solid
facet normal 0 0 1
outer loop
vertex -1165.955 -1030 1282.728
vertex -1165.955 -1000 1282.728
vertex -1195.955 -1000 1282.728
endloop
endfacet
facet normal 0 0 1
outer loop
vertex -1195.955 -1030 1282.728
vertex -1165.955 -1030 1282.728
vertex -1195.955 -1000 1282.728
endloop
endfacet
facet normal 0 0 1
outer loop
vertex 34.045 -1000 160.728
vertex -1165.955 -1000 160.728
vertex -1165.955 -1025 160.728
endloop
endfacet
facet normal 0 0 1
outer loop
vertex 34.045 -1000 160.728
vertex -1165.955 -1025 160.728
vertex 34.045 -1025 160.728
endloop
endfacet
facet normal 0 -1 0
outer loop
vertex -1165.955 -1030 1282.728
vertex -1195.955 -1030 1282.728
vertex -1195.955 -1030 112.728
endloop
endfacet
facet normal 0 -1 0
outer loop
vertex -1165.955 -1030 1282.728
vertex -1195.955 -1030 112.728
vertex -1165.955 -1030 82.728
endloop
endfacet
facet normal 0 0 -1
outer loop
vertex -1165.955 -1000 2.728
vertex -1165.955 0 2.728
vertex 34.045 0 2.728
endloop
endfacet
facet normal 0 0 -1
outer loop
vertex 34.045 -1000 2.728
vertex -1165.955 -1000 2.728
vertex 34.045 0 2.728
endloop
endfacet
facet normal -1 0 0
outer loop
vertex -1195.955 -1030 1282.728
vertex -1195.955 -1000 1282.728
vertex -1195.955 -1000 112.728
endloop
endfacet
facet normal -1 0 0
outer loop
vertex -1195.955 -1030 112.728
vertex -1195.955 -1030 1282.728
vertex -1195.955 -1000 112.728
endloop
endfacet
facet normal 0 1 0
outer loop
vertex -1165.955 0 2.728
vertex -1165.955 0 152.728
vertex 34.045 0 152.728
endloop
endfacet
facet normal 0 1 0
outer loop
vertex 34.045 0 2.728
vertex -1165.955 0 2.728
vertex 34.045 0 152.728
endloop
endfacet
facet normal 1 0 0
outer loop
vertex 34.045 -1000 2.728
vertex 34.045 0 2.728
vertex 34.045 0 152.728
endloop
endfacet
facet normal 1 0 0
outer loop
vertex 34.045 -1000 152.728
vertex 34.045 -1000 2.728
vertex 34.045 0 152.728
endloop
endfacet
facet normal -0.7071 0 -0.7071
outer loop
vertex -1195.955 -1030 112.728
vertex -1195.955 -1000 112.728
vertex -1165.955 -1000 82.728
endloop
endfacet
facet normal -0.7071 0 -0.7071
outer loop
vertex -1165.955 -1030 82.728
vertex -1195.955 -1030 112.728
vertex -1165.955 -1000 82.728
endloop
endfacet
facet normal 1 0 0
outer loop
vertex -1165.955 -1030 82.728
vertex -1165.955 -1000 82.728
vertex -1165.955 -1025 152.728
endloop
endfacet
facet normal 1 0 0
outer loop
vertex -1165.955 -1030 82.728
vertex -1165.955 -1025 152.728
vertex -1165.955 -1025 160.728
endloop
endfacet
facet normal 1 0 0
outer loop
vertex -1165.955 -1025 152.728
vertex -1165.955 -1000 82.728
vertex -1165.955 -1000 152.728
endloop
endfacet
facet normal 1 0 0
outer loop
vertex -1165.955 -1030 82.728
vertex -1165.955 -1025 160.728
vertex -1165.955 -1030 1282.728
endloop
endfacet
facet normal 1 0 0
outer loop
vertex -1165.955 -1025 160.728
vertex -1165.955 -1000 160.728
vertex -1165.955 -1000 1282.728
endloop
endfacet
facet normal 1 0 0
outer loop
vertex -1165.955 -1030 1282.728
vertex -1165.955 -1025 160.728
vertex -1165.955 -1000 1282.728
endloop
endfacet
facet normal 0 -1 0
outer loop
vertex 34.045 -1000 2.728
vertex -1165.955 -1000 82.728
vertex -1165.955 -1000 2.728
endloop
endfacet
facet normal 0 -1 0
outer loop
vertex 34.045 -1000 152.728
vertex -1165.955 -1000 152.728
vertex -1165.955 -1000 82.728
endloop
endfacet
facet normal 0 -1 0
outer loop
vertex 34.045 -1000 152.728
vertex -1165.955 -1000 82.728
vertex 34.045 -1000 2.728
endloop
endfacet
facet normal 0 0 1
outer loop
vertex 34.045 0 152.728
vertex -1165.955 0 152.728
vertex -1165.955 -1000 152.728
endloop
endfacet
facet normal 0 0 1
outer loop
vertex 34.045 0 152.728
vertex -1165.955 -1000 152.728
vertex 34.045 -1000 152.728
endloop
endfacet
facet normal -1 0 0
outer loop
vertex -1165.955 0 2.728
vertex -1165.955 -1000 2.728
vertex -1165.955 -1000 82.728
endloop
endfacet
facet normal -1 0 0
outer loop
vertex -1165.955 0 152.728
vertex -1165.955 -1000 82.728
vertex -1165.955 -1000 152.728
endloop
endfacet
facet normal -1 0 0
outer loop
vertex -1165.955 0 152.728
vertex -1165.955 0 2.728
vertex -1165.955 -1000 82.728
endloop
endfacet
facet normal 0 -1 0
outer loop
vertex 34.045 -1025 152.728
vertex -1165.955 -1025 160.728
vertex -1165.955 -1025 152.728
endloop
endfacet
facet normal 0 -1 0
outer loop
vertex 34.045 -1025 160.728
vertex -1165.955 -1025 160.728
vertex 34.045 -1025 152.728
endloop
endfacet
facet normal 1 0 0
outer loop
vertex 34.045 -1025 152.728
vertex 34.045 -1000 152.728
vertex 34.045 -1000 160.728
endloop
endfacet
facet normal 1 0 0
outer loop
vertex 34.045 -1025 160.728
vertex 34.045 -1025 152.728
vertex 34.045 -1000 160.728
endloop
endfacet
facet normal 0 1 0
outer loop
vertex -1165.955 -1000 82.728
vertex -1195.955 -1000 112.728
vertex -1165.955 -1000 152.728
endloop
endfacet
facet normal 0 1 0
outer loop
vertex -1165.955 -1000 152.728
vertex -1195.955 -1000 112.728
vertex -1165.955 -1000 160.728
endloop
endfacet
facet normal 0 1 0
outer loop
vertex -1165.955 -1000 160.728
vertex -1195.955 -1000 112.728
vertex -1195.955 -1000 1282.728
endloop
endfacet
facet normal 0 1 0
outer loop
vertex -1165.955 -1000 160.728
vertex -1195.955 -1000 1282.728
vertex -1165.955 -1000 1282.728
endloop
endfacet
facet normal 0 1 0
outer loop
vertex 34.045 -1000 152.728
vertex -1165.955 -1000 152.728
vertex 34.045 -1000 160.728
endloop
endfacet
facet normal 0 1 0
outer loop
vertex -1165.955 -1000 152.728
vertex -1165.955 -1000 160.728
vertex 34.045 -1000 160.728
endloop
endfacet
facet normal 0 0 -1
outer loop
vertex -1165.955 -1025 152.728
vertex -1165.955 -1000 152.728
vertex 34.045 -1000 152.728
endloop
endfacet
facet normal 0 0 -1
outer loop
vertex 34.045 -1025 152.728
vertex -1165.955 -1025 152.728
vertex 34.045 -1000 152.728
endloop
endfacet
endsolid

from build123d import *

# Parameters (mm, degrees)
F0_W     = 1200
F0_H     = 150
F1_DEPTH = 1000
F3_W     = 1200
F3_H     = 8
F4_DEPTH = 25
F7_DEPTH = 30


with BuildPart() as f1:
    # F0 (on Front) → F1 (new body)
    with BuildSketch(Plane.XZ):
        with Locations((-565.955239, 77.728495)):
            Rectangle(F0_W, F0_H)
    extrude(amount=F1_DEPTH)



with BuildPart() as f4:
    # F3 (on face) → F4 (new body)
    with BuildSketch(Plane.XZ.offset(1000)):
        with Locations((-565.955239, 156.728495)):
            Rectangle(F3_W, F3_H)
    extrude(amount=F4_DEPTH)


with BuildPart() as f1_1:
    add(f1.part)

    add(f4.part)  # F7 merges F4
    # F6 (on face) → F7 (join)
    with BuildSketch(Plane.XZ.offset(1000)):
        Polygon((-1165.955239, 152.728495), (-1165.955239, 1282.728495), (-1195.955239, 1282.728495), (-1195.955239, 152.728495), (-1195.955239, 112.728495), (-1165.955239, 82.728495), align=None)
    extrude(amount=F7_DEPTH)


solid = f1_1.part
